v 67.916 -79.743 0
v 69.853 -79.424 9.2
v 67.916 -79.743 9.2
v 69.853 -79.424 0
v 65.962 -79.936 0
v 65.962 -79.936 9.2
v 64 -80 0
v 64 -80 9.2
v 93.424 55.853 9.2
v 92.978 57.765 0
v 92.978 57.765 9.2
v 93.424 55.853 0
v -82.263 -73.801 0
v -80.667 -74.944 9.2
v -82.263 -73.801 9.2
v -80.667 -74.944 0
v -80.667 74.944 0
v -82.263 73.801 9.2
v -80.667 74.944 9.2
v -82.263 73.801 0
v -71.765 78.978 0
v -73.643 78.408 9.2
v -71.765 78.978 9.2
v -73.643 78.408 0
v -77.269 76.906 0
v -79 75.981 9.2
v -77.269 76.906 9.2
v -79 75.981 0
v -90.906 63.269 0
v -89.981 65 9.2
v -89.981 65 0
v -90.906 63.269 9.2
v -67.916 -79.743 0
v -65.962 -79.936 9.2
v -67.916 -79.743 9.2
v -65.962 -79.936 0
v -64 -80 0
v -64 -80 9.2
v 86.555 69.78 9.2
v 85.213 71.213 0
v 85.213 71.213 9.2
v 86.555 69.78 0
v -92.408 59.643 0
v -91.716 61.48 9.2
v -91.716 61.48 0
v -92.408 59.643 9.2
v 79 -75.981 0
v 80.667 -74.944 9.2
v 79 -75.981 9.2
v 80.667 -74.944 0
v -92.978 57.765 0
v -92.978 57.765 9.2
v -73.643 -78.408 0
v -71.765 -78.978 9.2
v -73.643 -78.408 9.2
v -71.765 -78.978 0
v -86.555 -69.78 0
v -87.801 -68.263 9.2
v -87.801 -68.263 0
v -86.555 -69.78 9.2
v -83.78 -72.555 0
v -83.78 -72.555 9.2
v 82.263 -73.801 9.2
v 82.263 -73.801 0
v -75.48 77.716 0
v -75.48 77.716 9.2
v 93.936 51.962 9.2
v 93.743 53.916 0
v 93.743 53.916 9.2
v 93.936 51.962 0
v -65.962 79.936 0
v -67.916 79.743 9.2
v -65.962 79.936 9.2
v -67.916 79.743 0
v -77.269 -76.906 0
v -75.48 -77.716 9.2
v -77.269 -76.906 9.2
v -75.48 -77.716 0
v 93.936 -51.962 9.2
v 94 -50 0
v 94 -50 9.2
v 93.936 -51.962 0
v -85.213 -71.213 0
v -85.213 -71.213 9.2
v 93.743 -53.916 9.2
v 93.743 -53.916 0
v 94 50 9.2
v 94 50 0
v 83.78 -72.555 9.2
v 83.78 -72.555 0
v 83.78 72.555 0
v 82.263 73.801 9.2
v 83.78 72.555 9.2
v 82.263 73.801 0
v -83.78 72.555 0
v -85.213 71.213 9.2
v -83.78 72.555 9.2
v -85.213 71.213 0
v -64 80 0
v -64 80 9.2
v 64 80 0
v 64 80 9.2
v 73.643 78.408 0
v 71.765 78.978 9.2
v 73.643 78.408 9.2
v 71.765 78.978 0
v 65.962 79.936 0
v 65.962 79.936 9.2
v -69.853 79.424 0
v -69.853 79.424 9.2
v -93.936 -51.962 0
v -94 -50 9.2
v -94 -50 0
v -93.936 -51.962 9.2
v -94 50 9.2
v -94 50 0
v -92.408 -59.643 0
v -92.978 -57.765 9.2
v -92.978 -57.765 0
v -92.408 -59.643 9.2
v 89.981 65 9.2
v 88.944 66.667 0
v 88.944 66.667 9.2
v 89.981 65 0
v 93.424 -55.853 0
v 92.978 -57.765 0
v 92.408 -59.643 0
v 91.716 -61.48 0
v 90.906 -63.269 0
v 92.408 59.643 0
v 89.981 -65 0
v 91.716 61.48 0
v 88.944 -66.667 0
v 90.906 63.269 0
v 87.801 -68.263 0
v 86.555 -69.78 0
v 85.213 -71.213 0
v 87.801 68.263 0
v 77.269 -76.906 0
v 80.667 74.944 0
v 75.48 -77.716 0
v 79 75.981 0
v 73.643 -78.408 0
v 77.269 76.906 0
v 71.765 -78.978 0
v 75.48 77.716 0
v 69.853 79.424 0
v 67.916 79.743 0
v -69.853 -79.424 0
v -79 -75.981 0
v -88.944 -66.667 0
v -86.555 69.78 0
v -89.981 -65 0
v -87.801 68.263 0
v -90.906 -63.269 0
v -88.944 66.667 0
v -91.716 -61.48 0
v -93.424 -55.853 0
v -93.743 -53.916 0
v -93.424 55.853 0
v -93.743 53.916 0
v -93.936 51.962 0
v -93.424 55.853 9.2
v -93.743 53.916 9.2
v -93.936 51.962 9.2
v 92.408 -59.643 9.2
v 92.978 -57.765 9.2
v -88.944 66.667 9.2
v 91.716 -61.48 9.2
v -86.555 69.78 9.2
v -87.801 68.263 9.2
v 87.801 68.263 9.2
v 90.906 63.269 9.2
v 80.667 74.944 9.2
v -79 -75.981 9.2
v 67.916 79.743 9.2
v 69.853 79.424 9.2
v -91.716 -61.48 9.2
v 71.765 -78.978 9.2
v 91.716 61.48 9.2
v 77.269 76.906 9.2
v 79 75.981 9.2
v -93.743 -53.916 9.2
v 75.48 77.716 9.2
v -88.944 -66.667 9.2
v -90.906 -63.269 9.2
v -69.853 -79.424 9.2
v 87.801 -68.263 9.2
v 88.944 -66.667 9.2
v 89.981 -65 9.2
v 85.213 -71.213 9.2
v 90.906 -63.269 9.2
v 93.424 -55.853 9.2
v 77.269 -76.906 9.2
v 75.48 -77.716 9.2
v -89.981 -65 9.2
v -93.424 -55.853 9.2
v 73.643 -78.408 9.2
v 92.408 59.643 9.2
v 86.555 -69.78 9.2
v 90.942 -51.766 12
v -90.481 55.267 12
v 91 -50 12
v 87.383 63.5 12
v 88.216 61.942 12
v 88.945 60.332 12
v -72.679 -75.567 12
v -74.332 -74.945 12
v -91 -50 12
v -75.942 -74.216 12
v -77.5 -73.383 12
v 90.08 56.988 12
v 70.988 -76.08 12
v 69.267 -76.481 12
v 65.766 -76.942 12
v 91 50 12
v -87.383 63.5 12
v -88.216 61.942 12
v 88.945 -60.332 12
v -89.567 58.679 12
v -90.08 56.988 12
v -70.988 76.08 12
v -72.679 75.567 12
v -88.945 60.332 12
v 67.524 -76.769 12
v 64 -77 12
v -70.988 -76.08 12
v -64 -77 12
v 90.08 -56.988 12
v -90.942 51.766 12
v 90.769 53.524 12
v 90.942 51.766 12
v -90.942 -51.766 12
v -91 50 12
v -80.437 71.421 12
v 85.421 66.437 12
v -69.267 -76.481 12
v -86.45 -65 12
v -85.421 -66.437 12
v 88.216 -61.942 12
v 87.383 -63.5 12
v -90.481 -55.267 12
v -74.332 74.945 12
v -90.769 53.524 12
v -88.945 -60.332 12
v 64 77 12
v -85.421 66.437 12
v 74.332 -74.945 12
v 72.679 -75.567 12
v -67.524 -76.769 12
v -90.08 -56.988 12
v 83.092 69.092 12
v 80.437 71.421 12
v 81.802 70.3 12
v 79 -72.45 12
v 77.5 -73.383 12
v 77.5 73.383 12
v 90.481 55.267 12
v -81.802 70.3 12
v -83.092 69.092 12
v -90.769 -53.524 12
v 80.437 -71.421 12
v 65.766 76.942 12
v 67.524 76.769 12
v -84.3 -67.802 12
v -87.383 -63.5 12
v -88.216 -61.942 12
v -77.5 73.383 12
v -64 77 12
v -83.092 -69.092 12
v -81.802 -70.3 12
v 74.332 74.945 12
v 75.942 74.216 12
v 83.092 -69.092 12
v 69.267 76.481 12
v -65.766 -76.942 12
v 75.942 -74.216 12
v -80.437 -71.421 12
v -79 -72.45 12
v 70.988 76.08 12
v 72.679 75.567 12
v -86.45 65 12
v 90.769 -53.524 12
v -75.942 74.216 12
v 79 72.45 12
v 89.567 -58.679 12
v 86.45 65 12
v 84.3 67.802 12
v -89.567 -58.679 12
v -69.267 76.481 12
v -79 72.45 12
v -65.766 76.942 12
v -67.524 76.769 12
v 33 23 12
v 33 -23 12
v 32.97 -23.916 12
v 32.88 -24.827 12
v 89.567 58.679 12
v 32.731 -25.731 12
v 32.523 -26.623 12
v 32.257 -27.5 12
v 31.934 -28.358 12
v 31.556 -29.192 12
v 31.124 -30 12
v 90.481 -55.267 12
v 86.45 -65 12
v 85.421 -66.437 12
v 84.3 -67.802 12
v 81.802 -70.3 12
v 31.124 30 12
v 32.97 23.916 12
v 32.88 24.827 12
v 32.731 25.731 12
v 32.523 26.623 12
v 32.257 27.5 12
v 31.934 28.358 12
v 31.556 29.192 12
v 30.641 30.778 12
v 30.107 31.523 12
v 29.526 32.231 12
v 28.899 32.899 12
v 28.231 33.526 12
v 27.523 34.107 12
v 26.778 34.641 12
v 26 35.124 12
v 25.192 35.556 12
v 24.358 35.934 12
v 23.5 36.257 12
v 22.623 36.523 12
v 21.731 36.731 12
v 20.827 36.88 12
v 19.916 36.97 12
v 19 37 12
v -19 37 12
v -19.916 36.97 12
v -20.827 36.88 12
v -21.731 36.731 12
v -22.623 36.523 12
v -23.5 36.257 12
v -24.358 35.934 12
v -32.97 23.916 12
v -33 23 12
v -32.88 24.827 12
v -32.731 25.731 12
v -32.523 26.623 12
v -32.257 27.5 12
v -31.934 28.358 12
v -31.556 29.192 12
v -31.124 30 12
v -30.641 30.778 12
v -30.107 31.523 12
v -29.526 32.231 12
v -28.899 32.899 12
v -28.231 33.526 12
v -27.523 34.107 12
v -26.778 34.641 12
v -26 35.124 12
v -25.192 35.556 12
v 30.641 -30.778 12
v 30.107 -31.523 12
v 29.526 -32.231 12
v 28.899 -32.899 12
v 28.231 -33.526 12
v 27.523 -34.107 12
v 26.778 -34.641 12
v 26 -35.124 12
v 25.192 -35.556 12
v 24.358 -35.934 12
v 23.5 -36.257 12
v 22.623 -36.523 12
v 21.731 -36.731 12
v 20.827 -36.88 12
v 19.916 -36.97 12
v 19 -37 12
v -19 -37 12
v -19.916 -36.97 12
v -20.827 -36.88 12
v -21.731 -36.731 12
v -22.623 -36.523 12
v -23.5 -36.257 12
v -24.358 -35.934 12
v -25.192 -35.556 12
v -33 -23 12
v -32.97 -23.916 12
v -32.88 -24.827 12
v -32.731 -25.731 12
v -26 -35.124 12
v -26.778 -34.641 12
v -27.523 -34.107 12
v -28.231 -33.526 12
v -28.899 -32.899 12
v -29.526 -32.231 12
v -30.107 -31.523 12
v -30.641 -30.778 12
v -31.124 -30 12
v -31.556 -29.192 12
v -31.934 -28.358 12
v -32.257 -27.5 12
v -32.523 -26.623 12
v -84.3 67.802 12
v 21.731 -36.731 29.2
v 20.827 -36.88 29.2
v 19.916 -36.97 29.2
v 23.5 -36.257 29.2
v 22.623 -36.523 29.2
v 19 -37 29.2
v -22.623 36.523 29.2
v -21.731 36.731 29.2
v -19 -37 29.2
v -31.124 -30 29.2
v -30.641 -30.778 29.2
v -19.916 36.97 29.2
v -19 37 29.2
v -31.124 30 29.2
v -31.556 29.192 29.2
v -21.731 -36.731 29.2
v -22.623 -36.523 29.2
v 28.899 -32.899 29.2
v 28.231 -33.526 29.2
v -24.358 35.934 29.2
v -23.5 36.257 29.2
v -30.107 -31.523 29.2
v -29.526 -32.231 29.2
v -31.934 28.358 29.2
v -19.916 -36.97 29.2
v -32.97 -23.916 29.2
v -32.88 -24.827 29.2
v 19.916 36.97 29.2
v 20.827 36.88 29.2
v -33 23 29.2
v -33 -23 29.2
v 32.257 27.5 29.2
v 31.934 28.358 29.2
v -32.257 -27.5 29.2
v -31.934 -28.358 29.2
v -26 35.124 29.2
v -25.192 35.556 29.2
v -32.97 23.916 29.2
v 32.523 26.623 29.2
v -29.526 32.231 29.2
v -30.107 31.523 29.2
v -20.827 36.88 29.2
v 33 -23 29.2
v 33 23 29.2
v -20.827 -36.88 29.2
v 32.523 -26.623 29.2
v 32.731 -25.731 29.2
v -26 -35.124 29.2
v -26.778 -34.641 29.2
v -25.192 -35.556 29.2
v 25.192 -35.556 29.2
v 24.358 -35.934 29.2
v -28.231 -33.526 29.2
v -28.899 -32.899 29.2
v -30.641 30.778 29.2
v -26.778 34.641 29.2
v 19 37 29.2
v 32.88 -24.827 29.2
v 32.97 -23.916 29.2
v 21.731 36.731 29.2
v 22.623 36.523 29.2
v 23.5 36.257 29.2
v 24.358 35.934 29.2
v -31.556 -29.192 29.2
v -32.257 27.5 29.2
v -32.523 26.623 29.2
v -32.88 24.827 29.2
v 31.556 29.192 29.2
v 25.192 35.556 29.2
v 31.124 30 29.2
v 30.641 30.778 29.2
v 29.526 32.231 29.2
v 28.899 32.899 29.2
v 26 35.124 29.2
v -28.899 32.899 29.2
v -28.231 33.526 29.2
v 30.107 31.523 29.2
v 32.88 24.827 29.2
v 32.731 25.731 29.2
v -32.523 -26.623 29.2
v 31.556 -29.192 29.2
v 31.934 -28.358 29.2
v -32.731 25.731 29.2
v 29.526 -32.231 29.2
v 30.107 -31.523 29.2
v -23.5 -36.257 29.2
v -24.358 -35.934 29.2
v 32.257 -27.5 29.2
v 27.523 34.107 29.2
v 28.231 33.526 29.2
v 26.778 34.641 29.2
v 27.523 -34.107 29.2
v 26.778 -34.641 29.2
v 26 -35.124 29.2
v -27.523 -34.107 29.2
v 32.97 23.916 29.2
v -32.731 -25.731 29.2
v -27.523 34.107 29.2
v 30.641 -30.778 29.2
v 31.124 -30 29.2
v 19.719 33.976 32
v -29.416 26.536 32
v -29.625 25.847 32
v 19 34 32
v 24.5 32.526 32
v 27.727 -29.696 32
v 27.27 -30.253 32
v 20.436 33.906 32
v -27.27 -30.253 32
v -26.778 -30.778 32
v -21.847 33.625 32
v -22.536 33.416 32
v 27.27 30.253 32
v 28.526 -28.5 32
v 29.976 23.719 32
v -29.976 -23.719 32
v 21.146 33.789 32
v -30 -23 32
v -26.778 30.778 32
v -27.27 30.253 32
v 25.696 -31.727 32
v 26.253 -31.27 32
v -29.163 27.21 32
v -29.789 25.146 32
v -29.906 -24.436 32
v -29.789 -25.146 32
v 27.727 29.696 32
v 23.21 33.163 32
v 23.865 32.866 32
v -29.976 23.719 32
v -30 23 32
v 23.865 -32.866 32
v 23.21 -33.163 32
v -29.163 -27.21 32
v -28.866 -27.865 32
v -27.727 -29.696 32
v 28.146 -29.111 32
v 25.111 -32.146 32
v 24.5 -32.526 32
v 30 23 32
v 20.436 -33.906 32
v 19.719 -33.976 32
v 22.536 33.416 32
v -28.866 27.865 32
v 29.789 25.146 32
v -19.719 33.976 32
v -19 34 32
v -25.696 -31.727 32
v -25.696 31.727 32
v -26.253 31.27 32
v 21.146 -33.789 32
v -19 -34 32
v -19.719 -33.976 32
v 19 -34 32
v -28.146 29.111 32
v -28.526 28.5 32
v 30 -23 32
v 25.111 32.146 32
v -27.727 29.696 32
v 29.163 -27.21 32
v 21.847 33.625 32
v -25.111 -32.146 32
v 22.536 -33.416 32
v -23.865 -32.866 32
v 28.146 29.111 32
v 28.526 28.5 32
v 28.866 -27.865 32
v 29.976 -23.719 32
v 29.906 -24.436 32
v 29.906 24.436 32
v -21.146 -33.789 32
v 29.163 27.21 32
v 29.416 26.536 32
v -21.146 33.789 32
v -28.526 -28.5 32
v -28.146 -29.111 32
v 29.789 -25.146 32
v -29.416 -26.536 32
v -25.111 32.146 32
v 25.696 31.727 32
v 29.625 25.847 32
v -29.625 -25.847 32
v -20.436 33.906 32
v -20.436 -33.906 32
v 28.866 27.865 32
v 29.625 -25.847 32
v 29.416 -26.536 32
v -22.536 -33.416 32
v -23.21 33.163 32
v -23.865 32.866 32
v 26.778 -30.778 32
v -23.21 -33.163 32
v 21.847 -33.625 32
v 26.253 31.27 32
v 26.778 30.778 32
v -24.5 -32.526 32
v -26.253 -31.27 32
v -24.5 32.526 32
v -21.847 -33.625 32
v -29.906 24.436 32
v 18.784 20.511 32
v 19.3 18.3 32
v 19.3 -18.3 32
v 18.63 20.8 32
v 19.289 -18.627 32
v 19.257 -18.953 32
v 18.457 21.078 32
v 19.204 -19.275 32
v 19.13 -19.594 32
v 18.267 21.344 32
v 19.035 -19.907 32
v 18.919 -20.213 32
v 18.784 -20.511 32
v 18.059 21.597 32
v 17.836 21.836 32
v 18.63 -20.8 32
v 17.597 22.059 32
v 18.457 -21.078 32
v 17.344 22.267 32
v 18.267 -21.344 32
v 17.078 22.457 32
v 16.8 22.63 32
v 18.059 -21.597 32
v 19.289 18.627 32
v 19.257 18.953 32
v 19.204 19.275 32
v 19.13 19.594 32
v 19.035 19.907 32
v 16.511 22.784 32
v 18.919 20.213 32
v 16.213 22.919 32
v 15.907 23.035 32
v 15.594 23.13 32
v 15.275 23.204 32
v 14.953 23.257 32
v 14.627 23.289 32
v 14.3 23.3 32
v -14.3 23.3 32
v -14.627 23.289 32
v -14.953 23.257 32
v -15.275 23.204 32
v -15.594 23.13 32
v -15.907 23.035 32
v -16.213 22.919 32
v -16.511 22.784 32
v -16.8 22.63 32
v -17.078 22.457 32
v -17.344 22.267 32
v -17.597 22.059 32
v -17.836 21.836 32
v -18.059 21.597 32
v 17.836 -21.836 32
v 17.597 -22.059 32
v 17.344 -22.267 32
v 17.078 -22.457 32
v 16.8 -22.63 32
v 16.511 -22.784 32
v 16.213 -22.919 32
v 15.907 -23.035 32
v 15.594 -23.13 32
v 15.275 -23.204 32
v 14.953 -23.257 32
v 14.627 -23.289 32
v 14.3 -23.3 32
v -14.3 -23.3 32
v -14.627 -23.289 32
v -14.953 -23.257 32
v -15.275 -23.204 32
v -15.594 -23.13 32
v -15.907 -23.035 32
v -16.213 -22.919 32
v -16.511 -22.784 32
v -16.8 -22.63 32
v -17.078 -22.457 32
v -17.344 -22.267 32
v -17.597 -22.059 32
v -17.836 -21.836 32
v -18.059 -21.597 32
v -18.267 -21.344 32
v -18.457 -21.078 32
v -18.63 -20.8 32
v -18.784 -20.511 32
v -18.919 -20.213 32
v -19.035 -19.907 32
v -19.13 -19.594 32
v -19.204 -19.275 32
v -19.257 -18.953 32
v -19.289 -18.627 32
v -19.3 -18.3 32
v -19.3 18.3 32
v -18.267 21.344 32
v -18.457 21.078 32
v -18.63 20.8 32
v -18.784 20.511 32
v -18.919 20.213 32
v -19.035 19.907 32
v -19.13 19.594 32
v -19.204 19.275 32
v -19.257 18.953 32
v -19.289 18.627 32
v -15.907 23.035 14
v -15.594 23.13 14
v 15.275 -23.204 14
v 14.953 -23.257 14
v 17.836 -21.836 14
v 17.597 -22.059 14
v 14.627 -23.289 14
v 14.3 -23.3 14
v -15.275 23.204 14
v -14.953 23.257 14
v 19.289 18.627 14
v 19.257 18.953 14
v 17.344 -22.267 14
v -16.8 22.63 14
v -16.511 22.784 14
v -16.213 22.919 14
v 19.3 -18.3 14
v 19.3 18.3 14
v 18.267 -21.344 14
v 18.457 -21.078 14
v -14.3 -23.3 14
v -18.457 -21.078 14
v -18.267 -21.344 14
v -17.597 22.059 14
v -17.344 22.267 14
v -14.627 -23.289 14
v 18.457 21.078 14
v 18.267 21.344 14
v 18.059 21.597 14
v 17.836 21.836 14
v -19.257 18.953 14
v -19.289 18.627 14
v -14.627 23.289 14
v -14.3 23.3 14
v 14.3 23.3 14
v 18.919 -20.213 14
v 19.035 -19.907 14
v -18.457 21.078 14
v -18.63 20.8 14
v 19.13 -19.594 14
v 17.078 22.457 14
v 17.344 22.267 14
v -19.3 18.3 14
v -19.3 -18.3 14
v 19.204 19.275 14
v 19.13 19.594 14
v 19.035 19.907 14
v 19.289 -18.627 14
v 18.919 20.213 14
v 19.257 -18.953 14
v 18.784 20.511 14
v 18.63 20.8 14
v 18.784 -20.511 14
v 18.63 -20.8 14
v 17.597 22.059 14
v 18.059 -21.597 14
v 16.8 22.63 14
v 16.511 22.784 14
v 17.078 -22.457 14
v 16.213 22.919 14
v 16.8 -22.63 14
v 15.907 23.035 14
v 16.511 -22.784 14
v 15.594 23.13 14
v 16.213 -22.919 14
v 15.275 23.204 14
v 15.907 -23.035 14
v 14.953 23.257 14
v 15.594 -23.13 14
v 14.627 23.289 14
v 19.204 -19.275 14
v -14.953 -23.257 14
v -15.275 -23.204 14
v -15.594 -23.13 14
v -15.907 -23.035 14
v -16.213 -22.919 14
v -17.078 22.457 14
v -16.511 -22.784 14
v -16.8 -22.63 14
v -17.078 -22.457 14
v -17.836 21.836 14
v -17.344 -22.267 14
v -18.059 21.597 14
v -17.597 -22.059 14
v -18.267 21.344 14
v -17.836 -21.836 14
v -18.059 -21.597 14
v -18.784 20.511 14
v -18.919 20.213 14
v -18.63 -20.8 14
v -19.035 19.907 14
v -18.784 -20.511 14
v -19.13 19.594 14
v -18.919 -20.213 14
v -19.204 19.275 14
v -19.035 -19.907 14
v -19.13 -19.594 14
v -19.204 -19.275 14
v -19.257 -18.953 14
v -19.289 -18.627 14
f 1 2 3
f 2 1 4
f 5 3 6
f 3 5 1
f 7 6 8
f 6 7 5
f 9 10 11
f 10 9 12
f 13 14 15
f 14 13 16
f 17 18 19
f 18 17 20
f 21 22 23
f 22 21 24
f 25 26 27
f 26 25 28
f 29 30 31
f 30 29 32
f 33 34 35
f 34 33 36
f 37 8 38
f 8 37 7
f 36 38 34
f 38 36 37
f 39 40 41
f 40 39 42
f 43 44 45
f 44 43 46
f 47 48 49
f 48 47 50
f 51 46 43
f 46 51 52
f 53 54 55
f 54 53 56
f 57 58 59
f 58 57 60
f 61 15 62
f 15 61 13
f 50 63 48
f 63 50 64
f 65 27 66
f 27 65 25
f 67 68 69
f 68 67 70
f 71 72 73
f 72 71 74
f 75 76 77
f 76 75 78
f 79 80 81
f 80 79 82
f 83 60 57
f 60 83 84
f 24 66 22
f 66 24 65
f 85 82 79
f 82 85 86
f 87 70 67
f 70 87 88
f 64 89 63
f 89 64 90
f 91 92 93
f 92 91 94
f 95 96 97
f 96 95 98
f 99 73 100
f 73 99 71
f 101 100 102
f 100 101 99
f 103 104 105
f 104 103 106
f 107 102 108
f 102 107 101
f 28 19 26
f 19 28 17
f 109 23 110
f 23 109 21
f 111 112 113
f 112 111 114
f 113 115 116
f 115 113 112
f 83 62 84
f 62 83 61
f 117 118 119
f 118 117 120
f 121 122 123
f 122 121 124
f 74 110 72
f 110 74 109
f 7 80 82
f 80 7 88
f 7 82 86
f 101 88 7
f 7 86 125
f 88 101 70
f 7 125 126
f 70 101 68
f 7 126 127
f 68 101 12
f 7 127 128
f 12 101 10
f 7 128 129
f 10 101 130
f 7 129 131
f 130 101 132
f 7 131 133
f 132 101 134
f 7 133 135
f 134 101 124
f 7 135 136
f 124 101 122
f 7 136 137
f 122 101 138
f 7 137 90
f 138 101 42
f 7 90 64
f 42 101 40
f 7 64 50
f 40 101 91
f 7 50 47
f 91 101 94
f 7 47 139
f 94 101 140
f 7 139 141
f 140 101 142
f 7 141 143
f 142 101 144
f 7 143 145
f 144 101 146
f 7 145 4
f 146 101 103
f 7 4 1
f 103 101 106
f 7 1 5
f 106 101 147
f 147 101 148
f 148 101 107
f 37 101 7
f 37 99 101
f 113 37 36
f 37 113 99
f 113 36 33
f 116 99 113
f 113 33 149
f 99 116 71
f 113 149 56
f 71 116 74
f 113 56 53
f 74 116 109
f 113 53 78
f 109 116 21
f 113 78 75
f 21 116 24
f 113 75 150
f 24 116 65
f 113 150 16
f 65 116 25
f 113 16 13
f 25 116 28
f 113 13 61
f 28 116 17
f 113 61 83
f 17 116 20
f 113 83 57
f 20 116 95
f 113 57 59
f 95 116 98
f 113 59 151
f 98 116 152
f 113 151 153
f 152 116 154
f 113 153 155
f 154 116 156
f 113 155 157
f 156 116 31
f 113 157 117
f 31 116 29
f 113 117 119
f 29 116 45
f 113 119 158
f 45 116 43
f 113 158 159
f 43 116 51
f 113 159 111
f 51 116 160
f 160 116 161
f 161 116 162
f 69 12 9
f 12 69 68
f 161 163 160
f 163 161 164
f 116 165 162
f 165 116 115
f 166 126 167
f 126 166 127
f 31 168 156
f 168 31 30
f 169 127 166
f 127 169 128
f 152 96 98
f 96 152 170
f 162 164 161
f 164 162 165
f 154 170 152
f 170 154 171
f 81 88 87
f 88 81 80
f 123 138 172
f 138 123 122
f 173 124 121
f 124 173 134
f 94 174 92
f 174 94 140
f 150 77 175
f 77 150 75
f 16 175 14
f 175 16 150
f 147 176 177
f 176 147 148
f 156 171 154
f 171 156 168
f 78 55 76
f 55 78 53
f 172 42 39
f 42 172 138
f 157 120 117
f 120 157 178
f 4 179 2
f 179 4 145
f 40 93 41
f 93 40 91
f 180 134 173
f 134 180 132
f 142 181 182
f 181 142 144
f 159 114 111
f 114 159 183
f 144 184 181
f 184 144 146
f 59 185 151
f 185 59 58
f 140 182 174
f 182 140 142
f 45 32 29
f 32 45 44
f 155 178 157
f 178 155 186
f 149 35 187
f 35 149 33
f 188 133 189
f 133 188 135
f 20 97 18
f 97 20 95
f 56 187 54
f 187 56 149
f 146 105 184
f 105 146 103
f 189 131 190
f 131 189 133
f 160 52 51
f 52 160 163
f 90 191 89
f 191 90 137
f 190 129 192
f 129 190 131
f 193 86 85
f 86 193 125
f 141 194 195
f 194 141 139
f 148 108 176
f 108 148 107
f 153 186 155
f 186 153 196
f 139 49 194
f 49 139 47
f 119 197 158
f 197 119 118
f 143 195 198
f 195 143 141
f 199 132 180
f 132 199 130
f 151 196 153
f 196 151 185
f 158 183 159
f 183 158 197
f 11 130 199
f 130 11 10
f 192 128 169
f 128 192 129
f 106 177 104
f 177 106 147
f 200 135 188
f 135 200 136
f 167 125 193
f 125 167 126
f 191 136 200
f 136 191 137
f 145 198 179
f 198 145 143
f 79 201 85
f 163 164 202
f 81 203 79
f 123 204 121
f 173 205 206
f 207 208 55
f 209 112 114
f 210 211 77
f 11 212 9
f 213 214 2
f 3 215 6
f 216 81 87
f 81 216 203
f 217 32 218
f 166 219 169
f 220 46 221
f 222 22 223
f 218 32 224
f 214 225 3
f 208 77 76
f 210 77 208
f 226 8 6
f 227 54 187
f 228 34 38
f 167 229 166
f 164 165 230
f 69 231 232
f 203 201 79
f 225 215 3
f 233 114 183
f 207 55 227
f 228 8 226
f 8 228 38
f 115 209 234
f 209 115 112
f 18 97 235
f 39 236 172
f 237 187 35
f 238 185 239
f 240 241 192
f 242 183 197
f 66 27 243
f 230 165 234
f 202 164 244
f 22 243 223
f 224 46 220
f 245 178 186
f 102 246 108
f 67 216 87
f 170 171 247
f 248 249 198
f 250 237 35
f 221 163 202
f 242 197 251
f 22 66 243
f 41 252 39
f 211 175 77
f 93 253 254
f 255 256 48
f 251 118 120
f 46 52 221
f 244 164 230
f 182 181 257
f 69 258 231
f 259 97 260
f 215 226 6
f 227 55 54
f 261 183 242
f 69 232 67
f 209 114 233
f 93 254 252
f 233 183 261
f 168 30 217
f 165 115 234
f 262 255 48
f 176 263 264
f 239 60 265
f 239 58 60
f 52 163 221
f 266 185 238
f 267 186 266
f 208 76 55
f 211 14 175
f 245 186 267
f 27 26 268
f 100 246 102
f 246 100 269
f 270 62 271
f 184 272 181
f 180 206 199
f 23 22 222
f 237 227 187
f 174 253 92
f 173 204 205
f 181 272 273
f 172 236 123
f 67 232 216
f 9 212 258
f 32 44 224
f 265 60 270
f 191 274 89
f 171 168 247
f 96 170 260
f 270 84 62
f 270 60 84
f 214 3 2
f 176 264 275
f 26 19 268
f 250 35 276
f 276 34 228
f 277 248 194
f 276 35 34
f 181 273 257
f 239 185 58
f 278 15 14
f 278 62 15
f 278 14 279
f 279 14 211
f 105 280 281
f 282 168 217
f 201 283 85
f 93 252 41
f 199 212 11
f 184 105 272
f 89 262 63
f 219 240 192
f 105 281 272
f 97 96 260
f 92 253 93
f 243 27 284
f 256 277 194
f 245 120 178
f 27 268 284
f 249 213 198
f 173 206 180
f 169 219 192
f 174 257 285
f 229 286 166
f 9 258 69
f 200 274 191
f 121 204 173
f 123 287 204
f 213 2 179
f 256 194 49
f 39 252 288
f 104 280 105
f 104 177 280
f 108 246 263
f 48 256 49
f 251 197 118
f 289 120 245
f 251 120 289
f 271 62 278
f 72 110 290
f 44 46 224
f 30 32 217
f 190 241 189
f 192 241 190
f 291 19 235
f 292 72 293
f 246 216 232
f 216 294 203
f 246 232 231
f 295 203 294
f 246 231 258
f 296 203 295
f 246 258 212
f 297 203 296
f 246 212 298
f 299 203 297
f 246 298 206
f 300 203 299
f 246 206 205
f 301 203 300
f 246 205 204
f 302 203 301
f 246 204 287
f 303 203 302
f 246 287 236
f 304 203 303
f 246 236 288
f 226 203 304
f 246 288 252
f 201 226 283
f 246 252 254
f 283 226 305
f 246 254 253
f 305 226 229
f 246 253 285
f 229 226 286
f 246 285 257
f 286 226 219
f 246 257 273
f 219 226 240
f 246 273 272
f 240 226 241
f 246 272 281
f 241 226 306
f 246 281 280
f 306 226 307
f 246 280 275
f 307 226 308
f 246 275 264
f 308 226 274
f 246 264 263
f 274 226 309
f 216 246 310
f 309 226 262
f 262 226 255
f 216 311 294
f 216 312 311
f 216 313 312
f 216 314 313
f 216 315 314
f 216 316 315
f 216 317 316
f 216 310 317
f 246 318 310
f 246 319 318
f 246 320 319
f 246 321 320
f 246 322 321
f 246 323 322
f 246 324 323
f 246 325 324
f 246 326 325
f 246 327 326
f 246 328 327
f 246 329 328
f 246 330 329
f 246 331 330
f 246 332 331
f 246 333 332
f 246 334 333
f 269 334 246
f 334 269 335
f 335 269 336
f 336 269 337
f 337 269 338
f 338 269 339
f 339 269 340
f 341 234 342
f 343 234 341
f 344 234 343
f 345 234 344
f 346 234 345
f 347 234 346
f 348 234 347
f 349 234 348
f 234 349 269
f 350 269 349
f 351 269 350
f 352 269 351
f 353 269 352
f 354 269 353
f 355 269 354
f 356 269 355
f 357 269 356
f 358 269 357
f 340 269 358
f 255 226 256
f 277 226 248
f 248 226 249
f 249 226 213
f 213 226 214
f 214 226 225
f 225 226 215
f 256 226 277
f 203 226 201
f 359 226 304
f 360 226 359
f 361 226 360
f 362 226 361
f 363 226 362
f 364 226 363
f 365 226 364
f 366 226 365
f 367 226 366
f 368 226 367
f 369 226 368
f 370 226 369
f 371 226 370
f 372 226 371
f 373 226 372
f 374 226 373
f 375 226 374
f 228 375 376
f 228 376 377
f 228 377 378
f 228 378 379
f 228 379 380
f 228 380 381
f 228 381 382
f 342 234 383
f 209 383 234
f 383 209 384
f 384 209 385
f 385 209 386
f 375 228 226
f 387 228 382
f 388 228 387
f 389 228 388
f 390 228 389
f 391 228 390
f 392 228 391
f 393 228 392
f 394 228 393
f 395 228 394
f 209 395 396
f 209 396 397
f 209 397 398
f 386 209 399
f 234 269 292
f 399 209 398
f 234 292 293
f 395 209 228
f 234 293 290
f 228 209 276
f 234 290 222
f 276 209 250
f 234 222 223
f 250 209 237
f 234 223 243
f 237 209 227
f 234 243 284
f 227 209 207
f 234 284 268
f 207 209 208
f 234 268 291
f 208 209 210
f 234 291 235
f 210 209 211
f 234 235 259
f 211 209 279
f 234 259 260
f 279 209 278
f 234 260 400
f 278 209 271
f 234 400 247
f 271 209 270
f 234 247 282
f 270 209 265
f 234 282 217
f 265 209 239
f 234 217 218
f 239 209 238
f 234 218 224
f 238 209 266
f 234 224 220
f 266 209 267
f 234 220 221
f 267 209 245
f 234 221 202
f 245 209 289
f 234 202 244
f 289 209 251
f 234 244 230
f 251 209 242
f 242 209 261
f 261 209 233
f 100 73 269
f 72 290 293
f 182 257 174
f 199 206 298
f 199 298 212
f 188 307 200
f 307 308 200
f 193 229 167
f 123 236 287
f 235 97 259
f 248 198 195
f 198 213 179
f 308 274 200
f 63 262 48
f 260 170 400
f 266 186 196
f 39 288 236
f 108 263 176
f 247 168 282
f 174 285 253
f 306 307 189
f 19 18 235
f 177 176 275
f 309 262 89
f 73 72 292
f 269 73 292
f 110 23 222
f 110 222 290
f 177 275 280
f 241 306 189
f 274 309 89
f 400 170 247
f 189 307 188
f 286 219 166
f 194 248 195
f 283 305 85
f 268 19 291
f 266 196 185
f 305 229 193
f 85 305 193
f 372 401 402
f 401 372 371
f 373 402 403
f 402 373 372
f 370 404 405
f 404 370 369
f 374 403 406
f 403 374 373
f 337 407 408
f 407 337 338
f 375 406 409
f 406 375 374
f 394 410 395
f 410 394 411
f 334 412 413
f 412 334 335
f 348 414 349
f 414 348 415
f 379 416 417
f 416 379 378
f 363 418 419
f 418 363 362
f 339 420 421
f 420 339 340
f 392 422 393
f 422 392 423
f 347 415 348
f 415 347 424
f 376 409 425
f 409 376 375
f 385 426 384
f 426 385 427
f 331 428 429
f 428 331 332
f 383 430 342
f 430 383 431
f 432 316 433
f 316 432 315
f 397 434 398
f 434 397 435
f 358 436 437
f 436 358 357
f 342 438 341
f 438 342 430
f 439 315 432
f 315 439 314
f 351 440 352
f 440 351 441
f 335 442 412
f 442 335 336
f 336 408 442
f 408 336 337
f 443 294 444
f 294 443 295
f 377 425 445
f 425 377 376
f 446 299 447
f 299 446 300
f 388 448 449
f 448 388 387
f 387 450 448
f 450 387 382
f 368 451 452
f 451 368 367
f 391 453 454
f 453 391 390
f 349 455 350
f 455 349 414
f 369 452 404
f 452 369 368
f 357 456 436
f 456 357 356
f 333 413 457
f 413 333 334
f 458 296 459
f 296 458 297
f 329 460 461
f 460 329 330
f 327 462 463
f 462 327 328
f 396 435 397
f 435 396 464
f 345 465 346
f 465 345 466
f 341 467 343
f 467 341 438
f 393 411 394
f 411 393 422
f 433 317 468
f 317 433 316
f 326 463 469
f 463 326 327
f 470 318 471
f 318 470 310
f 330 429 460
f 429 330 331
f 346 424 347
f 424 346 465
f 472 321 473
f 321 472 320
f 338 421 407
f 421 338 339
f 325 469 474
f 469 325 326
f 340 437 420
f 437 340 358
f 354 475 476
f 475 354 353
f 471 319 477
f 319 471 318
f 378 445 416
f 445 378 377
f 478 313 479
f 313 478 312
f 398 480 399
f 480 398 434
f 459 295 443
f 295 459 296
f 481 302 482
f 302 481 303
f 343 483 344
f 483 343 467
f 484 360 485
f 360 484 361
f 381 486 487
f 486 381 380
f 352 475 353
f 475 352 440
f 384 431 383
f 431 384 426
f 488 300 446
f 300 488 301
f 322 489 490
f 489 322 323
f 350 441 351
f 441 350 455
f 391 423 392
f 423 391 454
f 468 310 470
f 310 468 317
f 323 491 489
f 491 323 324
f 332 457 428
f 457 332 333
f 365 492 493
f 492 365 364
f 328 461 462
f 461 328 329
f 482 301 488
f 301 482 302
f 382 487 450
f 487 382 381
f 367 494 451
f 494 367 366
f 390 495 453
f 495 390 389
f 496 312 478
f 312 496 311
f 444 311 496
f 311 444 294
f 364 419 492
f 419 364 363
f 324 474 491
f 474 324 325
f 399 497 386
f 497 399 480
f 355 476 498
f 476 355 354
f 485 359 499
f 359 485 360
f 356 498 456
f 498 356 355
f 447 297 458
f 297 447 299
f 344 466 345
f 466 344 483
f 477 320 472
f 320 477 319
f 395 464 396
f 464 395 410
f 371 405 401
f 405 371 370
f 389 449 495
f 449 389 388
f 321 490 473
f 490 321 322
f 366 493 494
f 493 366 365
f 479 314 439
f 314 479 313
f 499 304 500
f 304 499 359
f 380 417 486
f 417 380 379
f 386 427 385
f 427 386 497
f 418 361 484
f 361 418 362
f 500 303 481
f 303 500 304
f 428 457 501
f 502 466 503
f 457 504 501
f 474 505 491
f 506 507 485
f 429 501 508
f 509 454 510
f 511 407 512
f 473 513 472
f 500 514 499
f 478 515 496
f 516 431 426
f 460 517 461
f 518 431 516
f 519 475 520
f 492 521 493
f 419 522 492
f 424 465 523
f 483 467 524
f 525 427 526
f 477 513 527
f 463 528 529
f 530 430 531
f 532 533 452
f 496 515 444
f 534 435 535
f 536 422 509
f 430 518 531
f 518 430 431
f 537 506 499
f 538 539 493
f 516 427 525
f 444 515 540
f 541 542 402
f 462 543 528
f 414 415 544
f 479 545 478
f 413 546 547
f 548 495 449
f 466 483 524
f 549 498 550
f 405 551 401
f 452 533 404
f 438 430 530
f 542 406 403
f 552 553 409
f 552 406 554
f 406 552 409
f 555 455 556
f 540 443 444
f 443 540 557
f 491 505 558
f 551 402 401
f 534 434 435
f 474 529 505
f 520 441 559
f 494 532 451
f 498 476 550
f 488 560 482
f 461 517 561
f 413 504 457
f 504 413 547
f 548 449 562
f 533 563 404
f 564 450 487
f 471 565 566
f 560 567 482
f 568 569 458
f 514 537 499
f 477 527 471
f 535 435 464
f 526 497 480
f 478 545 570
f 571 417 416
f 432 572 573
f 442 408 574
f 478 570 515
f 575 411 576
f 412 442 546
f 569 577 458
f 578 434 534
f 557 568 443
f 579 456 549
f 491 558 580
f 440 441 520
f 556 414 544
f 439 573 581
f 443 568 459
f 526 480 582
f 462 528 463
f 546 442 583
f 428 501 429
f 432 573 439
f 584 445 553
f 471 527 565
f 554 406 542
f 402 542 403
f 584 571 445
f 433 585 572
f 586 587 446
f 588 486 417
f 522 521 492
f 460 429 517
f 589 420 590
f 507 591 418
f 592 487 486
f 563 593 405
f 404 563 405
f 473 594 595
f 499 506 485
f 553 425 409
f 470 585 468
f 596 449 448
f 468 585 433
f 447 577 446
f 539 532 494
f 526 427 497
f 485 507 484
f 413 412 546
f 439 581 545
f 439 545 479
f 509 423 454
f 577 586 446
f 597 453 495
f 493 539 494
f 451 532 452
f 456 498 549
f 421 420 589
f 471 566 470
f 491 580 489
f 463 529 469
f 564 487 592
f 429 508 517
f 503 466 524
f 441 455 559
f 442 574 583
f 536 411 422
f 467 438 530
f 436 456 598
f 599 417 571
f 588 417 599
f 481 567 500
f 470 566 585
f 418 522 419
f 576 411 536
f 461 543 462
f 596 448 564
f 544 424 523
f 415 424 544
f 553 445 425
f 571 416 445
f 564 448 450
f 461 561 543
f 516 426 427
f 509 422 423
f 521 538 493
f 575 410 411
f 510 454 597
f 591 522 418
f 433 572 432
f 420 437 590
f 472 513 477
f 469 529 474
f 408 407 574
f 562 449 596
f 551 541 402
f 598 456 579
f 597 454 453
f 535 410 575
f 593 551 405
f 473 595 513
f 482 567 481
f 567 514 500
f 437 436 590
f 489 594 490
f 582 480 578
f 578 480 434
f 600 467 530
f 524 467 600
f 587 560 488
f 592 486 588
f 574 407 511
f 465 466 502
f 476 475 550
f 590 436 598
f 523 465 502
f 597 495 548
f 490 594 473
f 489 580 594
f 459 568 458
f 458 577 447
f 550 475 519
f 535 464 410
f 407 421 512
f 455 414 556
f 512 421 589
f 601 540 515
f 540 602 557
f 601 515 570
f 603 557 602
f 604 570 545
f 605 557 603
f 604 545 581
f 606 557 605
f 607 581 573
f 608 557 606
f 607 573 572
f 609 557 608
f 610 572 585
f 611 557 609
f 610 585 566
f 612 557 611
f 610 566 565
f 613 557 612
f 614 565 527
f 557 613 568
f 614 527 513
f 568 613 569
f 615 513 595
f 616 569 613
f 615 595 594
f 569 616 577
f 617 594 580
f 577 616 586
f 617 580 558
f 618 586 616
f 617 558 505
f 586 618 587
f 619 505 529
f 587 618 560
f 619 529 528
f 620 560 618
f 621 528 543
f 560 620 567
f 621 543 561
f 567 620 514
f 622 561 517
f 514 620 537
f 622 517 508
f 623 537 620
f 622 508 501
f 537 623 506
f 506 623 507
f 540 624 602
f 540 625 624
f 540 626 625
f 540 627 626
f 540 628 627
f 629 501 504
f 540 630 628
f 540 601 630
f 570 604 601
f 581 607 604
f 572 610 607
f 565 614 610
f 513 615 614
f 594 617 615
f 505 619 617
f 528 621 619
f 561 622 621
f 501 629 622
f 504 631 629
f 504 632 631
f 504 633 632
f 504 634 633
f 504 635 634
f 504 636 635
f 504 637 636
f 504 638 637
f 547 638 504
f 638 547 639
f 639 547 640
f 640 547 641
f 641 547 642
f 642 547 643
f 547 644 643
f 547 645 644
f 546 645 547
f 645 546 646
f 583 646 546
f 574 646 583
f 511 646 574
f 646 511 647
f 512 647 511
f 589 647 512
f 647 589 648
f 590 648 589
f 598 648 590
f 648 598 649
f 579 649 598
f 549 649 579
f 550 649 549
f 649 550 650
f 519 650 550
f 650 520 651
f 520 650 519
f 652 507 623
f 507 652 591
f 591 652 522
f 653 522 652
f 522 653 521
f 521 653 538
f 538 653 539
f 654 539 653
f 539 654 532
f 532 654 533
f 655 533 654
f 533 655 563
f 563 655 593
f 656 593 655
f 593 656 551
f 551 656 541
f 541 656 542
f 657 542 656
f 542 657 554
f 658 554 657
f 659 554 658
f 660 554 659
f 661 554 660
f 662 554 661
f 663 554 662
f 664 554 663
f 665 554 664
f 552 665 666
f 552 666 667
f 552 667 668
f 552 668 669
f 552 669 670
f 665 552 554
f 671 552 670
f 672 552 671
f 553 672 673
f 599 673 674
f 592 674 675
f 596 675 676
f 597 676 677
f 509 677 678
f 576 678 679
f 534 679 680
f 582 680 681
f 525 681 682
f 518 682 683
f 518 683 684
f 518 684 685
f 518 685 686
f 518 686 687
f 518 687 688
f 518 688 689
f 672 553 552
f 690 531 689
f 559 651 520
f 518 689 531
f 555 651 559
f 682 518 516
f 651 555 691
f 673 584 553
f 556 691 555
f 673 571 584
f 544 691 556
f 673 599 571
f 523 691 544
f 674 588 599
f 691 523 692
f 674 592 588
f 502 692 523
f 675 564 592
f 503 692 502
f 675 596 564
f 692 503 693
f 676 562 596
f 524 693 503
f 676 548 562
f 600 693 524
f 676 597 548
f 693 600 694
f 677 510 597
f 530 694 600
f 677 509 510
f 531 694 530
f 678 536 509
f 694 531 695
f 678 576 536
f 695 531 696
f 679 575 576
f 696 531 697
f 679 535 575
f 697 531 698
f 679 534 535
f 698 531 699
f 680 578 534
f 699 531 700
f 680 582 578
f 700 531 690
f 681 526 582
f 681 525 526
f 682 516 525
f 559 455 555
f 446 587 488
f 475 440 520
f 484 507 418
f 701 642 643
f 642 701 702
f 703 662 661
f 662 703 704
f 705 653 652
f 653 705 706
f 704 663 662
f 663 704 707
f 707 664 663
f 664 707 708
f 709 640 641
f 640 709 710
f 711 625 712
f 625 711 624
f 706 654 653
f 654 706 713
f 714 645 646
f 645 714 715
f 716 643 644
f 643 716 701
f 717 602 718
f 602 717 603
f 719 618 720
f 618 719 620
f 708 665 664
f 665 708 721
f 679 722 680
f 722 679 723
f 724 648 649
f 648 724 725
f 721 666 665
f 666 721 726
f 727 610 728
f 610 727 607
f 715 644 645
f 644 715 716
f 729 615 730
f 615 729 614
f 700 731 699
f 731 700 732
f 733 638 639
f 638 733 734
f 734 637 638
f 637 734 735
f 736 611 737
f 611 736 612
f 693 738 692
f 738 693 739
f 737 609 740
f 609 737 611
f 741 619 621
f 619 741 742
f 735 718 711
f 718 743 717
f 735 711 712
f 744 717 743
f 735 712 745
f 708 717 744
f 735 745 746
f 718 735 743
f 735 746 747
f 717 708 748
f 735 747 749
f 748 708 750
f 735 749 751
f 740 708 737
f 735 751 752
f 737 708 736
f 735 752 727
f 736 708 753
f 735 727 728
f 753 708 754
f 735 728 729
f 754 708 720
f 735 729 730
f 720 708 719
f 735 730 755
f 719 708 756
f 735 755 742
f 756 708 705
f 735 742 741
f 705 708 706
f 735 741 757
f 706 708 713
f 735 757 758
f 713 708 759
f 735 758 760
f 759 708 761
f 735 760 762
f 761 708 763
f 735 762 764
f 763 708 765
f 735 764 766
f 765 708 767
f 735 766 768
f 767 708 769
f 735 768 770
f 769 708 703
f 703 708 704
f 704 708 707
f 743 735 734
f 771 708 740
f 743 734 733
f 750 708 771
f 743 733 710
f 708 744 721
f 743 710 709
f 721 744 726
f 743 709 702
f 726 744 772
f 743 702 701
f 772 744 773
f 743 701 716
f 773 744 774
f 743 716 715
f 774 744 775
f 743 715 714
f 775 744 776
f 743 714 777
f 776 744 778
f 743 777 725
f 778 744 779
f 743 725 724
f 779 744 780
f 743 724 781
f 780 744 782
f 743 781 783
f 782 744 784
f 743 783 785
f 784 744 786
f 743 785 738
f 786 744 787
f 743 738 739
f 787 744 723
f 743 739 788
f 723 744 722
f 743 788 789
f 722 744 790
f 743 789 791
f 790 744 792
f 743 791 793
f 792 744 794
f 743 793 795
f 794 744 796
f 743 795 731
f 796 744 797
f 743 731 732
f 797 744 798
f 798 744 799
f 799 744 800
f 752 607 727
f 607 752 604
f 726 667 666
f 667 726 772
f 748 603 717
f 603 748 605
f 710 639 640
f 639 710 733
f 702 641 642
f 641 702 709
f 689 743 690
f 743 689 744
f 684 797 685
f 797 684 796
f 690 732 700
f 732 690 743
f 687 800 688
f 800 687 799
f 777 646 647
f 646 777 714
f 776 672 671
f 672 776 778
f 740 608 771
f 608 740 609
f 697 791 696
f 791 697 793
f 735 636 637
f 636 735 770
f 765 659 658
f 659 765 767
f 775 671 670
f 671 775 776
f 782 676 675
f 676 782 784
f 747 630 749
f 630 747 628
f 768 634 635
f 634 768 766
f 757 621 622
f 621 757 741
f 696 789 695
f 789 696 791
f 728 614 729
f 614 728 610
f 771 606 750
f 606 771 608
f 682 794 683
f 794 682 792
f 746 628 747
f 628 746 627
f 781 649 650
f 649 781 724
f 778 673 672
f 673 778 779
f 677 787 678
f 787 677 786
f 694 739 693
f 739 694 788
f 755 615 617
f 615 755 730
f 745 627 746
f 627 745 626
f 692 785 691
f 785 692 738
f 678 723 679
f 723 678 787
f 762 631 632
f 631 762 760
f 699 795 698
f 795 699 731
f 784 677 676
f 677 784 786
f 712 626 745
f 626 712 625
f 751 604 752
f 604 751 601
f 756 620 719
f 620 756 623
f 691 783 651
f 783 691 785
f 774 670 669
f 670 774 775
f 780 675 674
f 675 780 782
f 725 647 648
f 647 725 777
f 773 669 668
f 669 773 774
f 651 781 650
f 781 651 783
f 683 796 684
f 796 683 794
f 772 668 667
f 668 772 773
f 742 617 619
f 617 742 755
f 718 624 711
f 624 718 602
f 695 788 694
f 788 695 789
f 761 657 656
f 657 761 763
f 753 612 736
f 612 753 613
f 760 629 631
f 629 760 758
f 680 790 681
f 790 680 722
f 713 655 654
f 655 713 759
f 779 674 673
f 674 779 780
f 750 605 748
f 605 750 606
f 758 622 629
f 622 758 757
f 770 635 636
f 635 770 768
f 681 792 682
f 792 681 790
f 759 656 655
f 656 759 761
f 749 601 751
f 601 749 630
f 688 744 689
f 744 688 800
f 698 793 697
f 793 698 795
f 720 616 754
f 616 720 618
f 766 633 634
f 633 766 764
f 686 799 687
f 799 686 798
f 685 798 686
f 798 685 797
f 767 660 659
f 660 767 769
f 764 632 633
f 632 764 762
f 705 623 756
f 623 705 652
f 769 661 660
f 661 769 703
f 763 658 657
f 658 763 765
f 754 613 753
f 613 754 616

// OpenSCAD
// Headphone stand in three printable parts: base, post, hanger.
// No glue, no screws. Rectangular (non-round) blade tenons prevent spinning.
// All dimensions in mm. Print orientation is the exported orientation (+Z up).
//
// Assembly heights (assembly coordinates, desk at z=0):
//   base plate/boss top        0 .. 32
//   post                       14.5 .. 250  (17.5 mm of it inside the base socket)
//   hanger tenon               228.5 .. 250 (21.5 mm inside the post socket)
//   hanger saddle top centre   270
// Socket clearances: 0.3 mm per side (socket is tenon + 0.6 in each dimension),
// tenon tips stop 0.5 mm above socket floors; shoulders/faces give the depth stop
// for the hanger, and the post bottoms in its socket.

part = "base"; // [base, post, hanger, assembly]
cadverify_only = "";

$fn = 96;

/* [Base] */
base_w = 188;          // desk footprint, X
base_d = 160;          // desk footprint, Y
base_plate_top = 9;    // straight plate wall up to here, then 45 deg chamfer to 12
base_top_plate = 12;
boss_w = 66;
boss_d = 74;
boss_straight_top = 29; // then 45 deg chamfer to boss_top
boss_top = 32;
base_socket_w = 38.6;  // post 38 + 0.6
base_socket_d = 46.6;  // post 46 + 0.6
base_socket_floor = 14;

/* [Post] */
post_w = 38;
post_d = 46;
post_len = 235.5;      // tip (local z=0) to top (assembly 250)
post_top_socket_w = 24.6; // hanger tenon 24 + 0.6
post_top_socket_d = 34.6; // hanger tenon 34 + 0.6
post_top_socket_floor_local = 213.5; // assembly 228

/* [Hanger, modelled in print coordinates] */
// Print coordinates: X = saddle length, Y = height above tenon tip,
// Z = saddle width direction (part lies on its Z=0 side face on the bed).
hang_len_half = 69;    // overall saddle half length incl. rounded end point
hang_width = 34;       // >= 30 mm headband support width
hang_top_rel = 41.5;   // tenon tip to saddle crown; assembly 228.5 + 41.5 = 270
hang_arc_r = 170;      // crown radius of the headband contact surface
hang_plate_t = 10;     // saddle plate thickness (vertical, in profile)
hang_tenon_half_w = 12;  // tenon is 24 (X) x 34 (width)
hang_shoulder_rel = 21.5; // assembly 250, post top
hang_neck_half_w = 17;

function hang_top_z(x) = hang_top_rel - (hang_arc_r - sqrt(hang_arc_r*hang_arc_r - x*x));
function hang_bot_z(x) = hang_top_z(x) - hang_plate_t;

module rounded_rect(w, d, r) {
    offset(r = r) square([w - 2*r, d - 2*r], center = true);
}

module instance(name, part_name, unit = 1) {
    echo(cadverify_instance = [name, part_name, unit]);
    if (cadverify_only == "" || cadverify_only == name) children();
}

/* ---------- BASE (print = assembly orientation) ---------- */
module base_part() {
    difference() {
        // Outer corners of the plate and boss are rounded in plan view (corner
        // radius >= 6 mm) and the top rims have 45 deg x 3 mm chamfers, so
        // nothing sticks out beyond the bounding box or the support plane.
        union() {
            // desk plate with 45 deg top edge chamfer
            linear_extrude(base_plate_top) rounded_rect(base_w, base_d, 30);
            hull() {
                translate([0, 0, base_plate_top]) linear_extrude(0.2)
                    rounded_rect(base_w, base_d, 30);
                translate([0, 0, base_top_plate - 0.2]) linear_extrude(0.2)
                    rounded_rect(base_w - 6, base_d - 6, 27);
            }
            // raised boss / collar around the post socket, 45 deg top chamfer
            translate([0, 0, base_top_plate])
                linear_extrude(boss_straight_top - base_top_plate)
                    rounded_rect(boss_w, boss_d, 14);
            hull() {
                translate([0, 0, boss_straight_top]) linear_extrude(0.2)
                    rounded_rect(boss_w, boss_d, 14);
                translate([0, 0, boss_top - 0.2]) linear_extrude(0.2)
                    rounded_rect(boss_w - 6, boss_d - 6, 11);
            }
        }
        // blind rectangular socket for the post (stops post spinning)
        translate([0, 0, base_socket_floor])
            linear_extrude(boss_top - base_socket_floor + 2)
                rounded_rect(base_socket_w, base_socket_d, 5);
    }
}

/* ---------- POST (printed upright, local z=0 is tenon tip) ---------- */
module post_part() {
    difference() {
        // Solid rectangular column, corners rounded 8 mm in plan view.
        linear_extrude(post_len) rounded_rect(post_w, post_d, 8);
        // Blind rectangular socket in the top for the hanger blade tenon:
        // tenon + 0.6 mm per side (0.3 mm clearance); the non-round rectangle
        // is what stops the hanger spinning on the post.
        translate([0, 0, post_top_socket_floor_local])
            linear_extrude(post_len - post_top_socket_floor_local + 2)
                rounded_rect(post_top_socket_w, post_top_socket_d, 5);
    }
}

/* ---------- HANGER (printed on its side) ---------- */
module hanger_part() {
    top_pts    = [for (x = [56 : -8 : -56]) [x, hang_top_z(x)]];
    bot_r_pts  = [for (x = [48 : 8 : 64]) [x, hang_bot_z(x)]];
    bot_l_pts  = [for (x = [-64 : 8 : -48]) [x, hang_bot_z(x)]];
    mid64 = (hang_top_z(64) + hang_bot_z(64)) / 2;
    // Saddle/neck profile above the shoulder plane (print y = hang_shoulder_rel).
    profile = concat(
        [[-hang_neck_half_w, hang_shoulder_rel], [hang_neck_half_w, hang_shoulder_rel],
         [30, hang_bot_z(30)]],
        bot_r_pts,
        [[hang_len_half - 0.5, mid64], [64, hang_top_z(64)]],
        top_pts,
        [[-64, hang_top_z(64)], [-(hang_len_half - 0.5), mid64], [-64, hang_bot_z(64)]],
        bot_l_pts,
        [[-30, hang_bot_z(30)]]
    );
    difference() {
        union() {
            linear_extrude(hang_width) polygon(profile);
            // Blade tenon below the shoulder: 24 x 34 with 3 mm 45 deg corner
            // chamfers (not radii, so no near-horizontal surface floats above
            // the bed-side face when printed on its side). It clears the post
            // socket's 5 mm rounded corners and reaches 2 mm up into the neck
            // so the union is volumetric, not face-only.
            translate([0, 0, hang_width/2]) rotate([-90, 0, 0])
                linear_extrude(hang_shoulder_rel + 2)
                    polygon([[-9, -17], [9, -17], [12, -14], [12, 14],
                             [9, 17], [-9, 17], [-12, 14], [-12, -14]]);
        }
        // 45 deg chamfers on the two crown side edges, tangent to the crown
        // arc at |x| = 26 (hang_top_z(26) = crown - 2.0 mm). Each box is the
        // half-space beyond its chamfer plane, rotated -45 deg about X from
        // an origin on the plane:
        //   far side keeps Y + Z <= hang_top_z(26) + hang_width
        //   bed side keeps Y - Z <= hang_top_z(26)
        // Beyond |x| = 26 the plate keeps its full 34 mm width; at the crown
        // the two 45 deg breaks leave a 30.0 mm wide flat top (>= 30 mm for
        // the headband), and the arc gives the rounded profile. The bed-side
        // chamfer face itself is exactly 45 deg, so no supports are needed.
        translate([0, hang_top_z(26), hang_width]) rotate([-45, 0, 0])
            translate([-26, 0, 0]) cube([52, 40, 40]);
        translate([0, hang_top_z(26), 0]) rotate([-45, 0, 0])
            translate([-26, 0, 0]) cube([52, 40, 40]);
    }
}

/* ---------- Spec echoes ---------- */
if (part == "base") {
    echo(cadverify_spec = [
        ["bounds", [[-base_w/2, -base_d/2, 0], [base_w/2, base_d/2, boss_top]]],
        ["bodies", 1],
        ["through_holes", 0],
        ["support_faces", [["desk", "-z", 25000]]],
        ["overhangs_allowed", []],
        ["copies", 1],
        ["details", [
            ["plate", "material", [[-80, -60, 2], [80, 60, 10]], 0.99],
            ["boss_wall", "material", [[22, -30, 16], [31, 30, 28]], 0.99],
            ["post_socket", "void", [[-17, -21, 16], [17, 21, 30]], 0.99],
            ["socket_floor", "thickness", [0, 0, 42], [0, 0, -1], base_socket_floor],
            ["boss_socket_top", "view", [[-34, -38, 27], [34, 38, boss_top]]]
        ]]
    ]);
} else if (part == "post") {
    echo(cadverify_spec = [
        ["bounds", [[-post_w/2, -post_d/2, 0], [post_w/2, post_d/2, post_len]]],
        ["bodies", 1],
        ["through_holes", 0],
        ["support_faces", [["bed", "-z", 1500]]],
        ["overhangs_allowed", []],
        ["copies", 1],
        ["details", [
            ["column", "material", [[-16, -20, 30], [16, 20, 200]], 0.99],
            ["hanger_socket", "void", [[-10, -15, 216], [10, 15, 234]], 0.99],
            ["column_width", "thickness", [32, 0, 100], [-1, 0, 0], post_w],
            ["top_socket", "view", [[-19, -23, 210], [19, 23, post_len]]]
        ]]
    ]);
} else if (part == "hanger") {
    // actual extreme points are the saddle end tips at +-(hang_len_half - 0.5)
    echo(cadverify_spec = [
        ["bounds", [[-(hang_len_half - 0.5), 0, 0], [hang_len_half - 0.5, hang_top_rel, hang_width]]],
        ["bodies", 1],
        ["through_holes", 0],
        ["support_faces", [["bed", "-z", 1200]]],
        ["overhangs_allowed", [
            ["45deg crown chamfer on bed side", [[-36, 37, 0], [36, hang_top_rel, 5]]]
        ]],
        ["copies", 1],
        ["details", [
            ["saddle_plate", "material", [[-25, 32, 5], [25, 38, 29]], 0.99],
            ["tenon", "material", [[-10, 2, 5], [10, 20, 29]], 0.99],
            ["saddle_thickness", "thickness", [50, 52, 17], [0, -1, 0], hang_plate_t],
            ["rounded_crown", "view", [[-40, 27, 0], [40, hang_top_rel, hang_width]]]
        ]]
    ]);
} else if (part == "assembly") {
    echo(cadverify_spec = [
        ["bounds", [[-base_w/2, -base_d/2, 0], [base_w/2, base_d/2, 270]]],
        ["support_faces", [["desk", "-z", 25000]]],
        ["allowed_interferences", []],
        ["assembly_order", [
            [["base"], [0, 0, 0]],
            [["post"], [0, 0, -1]],
            [["hanger"], [0, 0, -1]]
        ]]
    ]);
}

/* ---------- Output ---------- */
if (part == "base") {
    base_part();
} else if (part == "post") {
    post_part();
} else if (part == "hanger") {
    hanger_part();
} else if (part == "assembly") {
    instance("base", "base") base_part();
    instance("post", "post") translate([0, 0, 14.5]) post_part();
    // hanger print coords (x, y=height rel. tenon tip, z=width)
    //   -> assembly (x, 17-z, 228.5+y): tenon tip at 228.5, crown at 270
    instance("hanger", "hanger")
        translate([0, hang_width/2, 228.5]) rotate([90, 0, 0]) hanger_part();
} else {
    assert(false, str("unknown part: ", part));
}
